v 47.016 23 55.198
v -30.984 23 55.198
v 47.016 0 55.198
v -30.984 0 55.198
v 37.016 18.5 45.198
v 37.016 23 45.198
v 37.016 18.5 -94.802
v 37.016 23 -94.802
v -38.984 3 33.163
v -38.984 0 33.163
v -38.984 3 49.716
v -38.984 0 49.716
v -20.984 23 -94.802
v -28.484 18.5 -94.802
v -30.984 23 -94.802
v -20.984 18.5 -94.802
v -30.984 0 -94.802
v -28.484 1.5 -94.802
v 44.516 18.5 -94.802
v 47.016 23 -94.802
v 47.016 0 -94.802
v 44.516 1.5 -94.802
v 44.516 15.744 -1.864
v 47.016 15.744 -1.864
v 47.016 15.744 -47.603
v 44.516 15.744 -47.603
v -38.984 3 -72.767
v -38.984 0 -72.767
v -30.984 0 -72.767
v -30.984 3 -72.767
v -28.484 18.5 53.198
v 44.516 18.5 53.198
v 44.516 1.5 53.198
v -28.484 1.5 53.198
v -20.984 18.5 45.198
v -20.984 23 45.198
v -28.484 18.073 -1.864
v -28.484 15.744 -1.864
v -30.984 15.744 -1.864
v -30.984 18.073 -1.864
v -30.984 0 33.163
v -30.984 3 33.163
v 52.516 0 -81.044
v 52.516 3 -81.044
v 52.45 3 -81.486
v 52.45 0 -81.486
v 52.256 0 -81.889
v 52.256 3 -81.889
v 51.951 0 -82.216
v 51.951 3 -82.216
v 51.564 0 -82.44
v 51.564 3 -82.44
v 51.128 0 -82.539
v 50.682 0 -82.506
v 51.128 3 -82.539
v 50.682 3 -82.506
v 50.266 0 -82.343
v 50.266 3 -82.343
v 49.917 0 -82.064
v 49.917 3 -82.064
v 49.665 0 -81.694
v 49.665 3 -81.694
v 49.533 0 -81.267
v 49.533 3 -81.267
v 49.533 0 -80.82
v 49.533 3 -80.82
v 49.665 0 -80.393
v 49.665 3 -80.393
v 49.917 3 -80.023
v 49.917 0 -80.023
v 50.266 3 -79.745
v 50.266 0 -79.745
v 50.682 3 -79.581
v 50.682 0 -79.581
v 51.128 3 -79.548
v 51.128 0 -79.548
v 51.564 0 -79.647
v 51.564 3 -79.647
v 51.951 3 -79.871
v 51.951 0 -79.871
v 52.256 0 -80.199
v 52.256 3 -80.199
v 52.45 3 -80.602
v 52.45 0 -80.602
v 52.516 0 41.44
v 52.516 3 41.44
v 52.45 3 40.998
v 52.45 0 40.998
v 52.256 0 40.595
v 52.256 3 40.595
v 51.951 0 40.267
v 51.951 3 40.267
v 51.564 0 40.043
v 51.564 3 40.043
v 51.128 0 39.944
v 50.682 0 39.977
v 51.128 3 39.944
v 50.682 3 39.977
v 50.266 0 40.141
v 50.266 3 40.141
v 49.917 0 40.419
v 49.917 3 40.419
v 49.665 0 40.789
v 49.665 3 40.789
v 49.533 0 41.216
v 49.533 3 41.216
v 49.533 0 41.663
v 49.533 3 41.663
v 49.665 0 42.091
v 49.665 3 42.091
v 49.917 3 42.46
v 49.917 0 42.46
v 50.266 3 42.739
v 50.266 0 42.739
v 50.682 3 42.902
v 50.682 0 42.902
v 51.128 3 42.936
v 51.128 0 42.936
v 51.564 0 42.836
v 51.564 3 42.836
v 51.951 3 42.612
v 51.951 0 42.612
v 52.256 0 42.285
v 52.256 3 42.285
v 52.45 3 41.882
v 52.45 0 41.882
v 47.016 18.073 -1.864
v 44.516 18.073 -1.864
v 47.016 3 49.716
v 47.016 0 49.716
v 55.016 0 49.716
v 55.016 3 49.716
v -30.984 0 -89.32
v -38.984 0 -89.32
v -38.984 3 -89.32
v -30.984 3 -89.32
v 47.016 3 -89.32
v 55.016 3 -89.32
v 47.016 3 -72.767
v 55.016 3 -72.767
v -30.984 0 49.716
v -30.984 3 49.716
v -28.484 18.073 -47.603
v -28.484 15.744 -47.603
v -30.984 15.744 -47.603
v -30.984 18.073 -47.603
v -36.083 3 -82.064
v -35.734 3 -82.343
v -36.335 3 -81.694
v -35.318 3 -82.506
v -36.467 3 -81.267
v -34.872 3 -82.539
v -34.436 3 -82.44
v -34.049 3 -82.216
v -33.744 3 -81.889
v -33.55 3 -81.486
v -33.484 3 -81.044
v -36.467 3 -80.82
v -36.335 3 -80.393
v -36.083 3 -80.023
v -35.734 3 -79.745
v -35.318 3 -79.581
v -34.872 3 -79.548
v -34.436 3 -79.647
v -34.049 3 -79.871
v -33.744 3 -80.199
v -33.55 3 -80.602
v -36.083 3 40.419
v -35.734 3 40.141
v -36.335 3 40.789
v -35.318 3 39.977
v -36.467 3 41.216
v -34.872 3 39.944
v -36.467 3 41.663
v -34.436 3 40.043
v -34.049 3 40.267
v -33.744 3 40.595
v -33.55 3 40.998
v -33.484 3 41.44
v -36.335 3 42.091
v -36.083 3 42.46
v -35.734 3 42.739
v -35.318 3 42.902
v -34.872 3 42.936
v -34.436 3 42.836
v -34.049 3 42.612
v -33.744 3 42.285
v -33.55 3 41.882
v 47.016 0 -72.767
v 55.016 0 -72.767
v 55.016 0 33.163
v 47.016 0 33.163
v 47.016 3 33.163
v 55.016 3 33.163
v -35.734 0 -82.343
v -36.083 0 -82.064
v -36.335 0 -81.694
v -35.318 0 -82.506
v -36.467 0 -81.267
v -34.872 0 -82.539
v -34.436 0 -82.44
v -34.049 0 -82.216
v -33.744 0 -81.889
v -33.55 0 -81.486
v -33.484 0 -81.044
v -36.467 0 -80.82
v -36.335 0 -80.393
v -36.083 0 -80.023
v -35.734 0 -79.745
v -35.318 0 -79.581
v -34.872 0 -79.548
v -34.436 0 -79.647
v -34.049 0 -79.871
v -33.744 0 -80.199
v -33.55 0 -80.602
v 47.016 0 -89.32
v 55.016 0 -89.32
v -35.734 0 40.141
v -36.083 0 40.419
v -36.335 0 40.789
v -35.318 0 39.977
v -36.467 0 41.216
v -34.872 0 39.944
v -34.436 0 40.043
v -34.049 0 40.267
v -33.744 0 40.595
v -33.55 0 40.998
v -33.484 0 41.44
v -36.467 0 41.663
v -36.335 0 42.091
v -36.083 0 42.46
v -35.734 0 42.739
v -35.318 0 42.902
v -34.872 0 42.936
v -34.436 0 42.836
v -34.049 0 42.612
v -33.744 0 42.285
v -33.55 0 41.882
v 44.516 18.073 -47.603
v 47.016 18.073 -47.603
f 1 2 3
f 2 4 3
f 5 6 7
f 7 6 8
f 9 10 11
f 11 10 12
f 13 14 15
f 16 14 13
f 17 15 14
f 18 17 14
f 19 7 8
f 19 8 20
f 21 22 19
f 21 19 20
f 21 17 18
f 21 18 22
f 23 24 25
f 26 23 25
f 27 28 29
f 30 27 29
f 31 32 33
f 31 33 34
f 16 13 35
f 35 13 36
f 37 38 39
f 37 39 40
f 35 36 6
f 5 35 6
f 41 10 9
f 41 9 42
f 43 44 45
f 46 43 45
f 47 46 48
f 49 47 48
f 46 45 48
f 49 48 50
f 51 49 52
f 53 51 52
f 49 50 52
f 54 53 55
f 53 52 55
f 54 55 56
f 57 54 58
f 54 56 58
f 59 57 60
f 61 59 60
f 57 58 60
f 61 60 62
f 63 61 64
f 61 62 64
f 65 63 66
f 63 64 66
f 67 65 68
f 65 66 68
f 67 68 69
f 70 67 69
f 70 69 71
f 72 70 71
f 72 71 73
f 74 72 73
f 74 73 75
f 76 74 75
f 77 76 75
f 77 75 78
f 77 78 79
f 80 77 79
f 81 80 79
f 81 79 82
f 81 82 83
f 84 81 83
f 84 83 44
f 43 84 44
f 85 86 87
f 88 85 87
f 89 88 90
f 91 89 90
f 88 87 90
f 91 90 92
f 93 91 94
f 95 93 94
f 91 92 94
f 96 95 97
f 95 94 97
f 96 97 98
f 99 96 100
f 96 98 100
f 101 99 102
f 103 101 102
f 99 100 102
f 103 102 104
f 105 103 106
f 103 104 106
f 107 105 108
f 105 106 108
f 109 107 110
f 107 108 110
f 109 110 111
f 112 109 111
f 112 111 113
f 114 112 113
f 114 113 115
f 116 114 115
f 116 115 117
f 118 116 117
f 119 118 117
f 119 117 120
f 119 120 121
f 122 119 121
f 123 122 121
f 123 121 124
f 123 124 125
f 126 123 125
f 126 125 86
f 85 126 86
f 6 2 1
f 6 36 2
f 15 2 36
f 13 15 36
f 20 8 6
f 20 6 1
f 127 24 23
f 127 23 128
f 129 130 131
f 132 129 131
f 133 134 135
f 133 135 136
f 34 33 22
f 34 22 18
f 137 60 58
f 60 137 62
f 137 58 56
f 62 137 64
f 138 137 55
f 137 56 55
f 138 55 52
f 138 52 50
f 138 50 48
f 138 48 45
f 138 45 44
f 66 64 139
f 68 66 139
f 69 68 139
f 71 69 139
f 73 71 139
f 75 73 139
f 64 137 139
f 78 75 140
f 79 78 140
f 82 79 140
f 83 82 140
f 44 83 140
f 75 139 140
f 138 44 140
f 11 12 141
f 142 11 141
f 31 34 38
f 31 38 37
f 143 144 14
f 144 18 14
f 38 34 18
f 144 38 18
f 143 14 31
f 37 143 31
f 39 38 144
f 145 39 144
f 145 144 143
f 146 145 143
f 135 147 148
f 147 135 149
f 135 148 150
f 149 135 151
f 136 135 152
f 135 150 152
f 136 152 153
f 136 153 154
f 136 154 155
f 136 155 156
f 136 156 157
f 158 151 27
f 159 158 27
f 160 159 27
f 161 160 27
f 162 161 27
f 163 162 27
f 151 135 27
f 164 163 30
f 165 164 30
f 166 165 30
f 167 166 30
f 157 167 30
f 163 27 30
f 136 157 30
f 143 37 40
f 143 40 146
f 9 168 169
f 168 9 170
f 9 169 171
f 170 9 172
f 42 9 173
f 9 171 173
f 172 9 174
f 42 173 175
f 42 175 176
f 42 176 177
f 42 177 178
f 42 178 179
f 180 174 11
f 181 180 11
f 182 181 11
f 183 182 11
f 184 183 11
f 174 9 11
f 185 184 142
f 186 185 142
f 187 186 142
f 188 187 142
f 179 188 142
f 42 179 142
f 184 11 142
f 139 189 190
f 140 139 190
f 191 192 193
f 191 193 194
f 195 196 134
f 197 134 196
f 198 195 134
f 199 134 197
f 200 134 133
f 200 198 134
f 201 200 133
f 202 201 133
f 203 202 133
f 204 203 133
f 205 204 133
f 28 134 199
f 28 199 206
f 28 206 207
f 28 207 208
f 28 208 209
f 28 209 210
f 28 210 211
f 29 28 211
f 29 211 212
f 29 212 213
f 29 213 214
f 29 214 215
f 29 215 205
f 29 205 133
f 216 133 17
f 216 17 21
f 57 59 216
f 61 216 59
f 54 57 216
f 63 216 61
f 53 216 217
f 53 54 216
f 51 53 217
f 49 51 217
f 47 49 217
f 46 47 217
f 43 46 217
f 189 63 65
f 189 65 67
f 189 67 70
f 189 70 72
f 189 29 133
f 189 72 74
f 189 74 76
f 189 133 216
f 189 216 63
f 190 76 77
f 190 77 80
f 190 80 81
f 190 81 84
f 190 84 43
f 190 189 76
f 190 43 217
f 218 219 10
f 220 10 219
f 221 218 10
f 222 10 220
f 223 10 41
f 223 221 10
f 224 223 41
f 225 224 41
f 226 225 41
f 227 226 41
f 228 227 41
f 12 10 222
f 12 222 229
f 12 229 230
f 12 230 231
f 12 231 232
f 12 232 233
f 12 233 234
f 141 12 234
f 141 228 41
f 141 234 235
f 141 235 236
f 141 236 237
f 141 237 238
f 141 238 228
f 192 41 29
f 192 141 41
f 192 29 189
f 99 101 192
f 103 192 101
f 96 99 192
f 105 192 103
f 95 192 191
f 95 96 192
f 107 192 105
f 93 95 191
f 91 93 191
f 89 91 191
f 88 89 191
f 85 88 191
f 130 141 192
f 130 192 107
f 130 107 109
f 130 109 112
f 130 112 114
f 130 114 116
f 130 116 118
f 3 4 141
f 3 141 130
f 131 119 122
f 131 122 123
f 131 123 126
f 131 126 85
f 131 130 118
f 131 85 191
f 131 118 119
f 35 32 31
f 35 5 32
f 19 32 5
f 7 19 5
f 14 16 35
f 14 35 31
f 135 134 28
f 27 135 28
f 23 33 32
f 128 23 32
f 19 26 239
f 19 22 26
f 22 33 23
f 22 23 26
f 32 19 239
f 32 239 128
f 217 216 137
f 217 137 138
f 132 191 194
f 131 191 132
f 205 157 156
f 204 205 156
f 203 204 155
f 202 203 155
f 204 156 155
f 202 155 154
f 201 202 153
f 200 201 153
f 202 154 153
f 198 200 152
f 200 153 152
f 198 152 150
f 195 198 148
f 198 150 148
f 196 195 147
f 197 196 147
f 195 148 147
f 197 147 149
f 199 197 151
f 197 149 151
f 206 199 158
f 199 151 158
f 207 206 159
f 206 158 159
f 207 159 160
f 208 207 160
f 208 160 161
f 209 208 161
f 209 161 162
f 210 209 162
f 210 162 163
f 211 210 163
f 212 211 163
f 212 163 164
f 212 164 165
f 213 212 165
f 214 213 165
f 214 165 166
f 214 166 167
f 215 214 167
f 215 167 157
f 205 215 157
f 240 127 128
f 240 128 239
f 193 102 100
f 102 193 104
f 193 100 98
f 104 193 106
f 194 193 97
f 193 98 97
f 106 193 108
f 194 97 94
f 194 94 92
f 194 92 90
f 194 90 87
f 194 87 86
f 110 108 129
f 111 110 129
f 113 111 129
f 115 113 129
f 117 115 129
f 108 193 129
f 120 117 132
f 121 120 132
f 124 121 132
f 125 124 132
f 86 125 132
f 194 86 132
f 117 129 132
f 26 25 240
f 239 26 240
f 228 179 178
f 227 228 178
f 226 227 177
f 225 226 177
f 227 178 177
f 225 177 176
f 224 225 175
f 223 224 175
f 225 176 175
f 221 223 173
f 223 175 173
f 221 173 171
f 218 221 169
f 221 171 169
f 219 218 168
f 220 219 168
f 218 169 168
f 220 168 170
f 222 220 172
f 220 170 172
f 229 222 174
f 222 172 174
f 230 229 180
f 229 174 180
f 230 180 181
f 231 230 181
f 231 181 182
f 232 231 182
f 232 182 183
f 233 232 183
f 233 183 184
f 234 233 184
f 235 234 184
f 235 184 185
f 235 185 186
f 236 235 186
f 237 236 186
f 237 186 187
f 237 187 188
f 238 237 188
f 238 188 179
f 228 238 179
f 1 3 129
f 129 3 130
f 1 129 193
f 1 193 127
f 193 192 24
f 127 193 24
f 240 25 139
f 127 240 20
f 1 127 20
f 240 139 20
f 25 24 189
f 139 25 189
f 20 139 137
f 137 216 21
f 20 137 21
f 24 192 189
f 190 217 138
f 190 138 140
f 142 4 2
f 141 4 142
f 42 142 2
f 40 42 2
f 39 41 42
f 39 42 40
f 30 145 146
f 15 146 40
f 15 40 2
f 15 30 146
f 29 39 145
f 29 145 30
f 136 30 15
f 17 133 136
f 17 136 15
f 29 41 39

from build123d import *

# Parameters (mm, degrees)
IZIM1_W                     = 78
IZIM1_H                     = 150
Y_KSEKLIK_EKSTR_ZYON1_DEPTH = 18
IZIM2_W                     = 73
IZIM2_H                     = 17
KES_EKSTR_ZYON1_DEPTH       = 143
IZIM3_W                     = 78
IZIM3_H                     = 150
Y_KSEKLIK_EKSTR_ZYON2_DEPTH = 5
IZIM4_W                     = 73
IZIM4_H                     = 17
KES_EKSTR_ZYON2_DEPTH       = 148
IZIM6_W                     = 58
IZIM6_H                     = 130
IZIM6_H_2                   = 10
KES_EKSTR_ZYON3_DEPTH       = 10
IZIM7_W                     = 45.739377618
IZIM7_H                     = 2.329706958
KES_EKSTR_ZYON5_DEPTH       = 147
IZIM8_W                     = 94
IZIM8_H                     = 16.552930253
Y_KSEKLIK_EKSTR_ZYON4_DEPTH = 3
IZIM10_W                    = 73
IZIM10_H                    = 17
KES_EKSTR_ZYON7_DEPTH       = 146
IZIM11_R                    = 1.5
KES_EKSTR_ZYON8_DEPTH       = 146


with BuildPart() as part:
    # Çizim1 → Yükseklik-Ekstrüzyon1 (new body)
    with BuildSketch(Plane(origin=(0, 0, 0), x_dir=(1, 0, 0), z_dir=(0, 1, 0))):
        with Locations((8.016202101, 19.801973492)):
            Rectangle(IZIM1_W, IZIM1_H)
    extrude(amount=Y_KSEKLIK_EKSTR_ZYON1_DEPTH)

    # Çizim2 → Kes-Ekstrüzyon1 (cut)
    with BuildSketch(Plane(origin=(0, 0, -94.801973492), x_dir=(-1, 0, 0), z_dir=(0, 0, -1))):
        with Locations((-8.016202101, 10)):
            Rectangle(IZIM2_W, IZIM2_H)
    extrude(amount=-KES_EKSTR_ZYON1_DEPTH, mode=Mode.SUBTRACT)

    # Çizim3 → Yükseklik-Ekstrüzyon2 (add)
    with BuildSketch(Plane(origin=(0, 18, 0), x_dir=(1, 0, 0), z_dir=(0, 1, 0))):
        with Locations((8.016202101, 19.801973492)):
            Rectangle(IZIM3_W, IZIM3_H)
    extrude(amount=Y_KSEKLIK_EKSTR_ZYON2_DEPTH)

    # Çizim4 → Kes-Ekstrüzyon2 (cut)
    with BuildSketch(Plane(origin=(0, 0, -94.801973492), x_dir=(-1, 0, 0), z_dir=(0, 0, -1))):
        with Locations((-8.016202101, 10)):
            Rectangle(IZIM4_W, IZIM4_H)
    extrude(amount=-KES_EKSTR_ZYON2_DEPTH, mode=Mode.SUBTRACT)

    # Çizim6 → Kes-Ekstrüzyon3 (cut)
    with BuildSketch(Plane(origin=(0, 23, 0), x_dir=(1, 0, 0), z_dir=(0, 1, 0))):
        with Locations((8.016202101, 19.801973492)):
            Rectangle(IZIM6_W, IZIM6_H)
        with Locations((8.016202101, 89.801973492)):
            Rectangle(IZIM6_W, IZIM6_H_2)
    extrude(amount=-KES_EKSTR_ZYON3_DEPTH, mode=Mode.SUBTRACT)

    # Çizim7 → Kes-Ekstrüzyon5 (cut)
    with BuildSketch(Plane(origin=(47.016202101, 0, 0), x_dir=(0, 0, -1), z_dir=(1, 0, 0))):
        with Locations((24.733454375, 16.908564322)):
            Rectangle(IZIM7_W, IZIM7_H)
    extrude(amount=-KES_EKSTR_ZYON5_DEPTH, mode=Mode.SUBTRACT)

    # Çizim8 → Yükseklik-Ekstrüzyon4 (add)
    with BuildSketch(Plane.XZ):
        with Locations((8.016202101, 41.439700866)):
            Rectangle(IZIM8_W, IZIM8_H)
        with Locations((8.016202101, -81.04364785)):
            Rectangle(IZIM8_W, IZIM8_H)
    extrude(amount=-Y_KSEKLIK_EKSTR_ZYON4_DEPTH)

    # Çizim10 → Kes-Ekstrüzyon7 (cut)
    with BuildSketch(Plane(origin=(0, 0, -94.801973492), x_dir=(-1, 0, 0), z_dir=(0, 0, -1))):
        with Locations((-8.016202101, 10)):
            Rectangle(IZIM10_W, IZIM10_H)
    extrude(amount=-KES_EKSTR_ZYON7_DEPTH, mode=Mode.SUBTRACT)

    # Çizim11 → Kes-Ekstrüzyon8 (cut)
    with BuildSketch(Plane(origin=(0, 3, 0), x_dir=(1, 0, 0), z_dir=(0, 1, 0))):
        with Locations((-34.983797899, -41.439700866)):
            Circle(IZIM11_R)
        with Locations((51.016202101, -41.439700866)):
            Circle(IZIM11_R)
        with Locations((51.016202101, 81.043647849)):
            Circle(IZIM11_R)
        with Locations((-34.983797899, 81.043647849)):
            Circle(IZIM11_R)
    extrude(amount=-KES_EKSTR_ZYON8_DEPTH, mode=Mode.SUBTRACT)


solid = part.part
